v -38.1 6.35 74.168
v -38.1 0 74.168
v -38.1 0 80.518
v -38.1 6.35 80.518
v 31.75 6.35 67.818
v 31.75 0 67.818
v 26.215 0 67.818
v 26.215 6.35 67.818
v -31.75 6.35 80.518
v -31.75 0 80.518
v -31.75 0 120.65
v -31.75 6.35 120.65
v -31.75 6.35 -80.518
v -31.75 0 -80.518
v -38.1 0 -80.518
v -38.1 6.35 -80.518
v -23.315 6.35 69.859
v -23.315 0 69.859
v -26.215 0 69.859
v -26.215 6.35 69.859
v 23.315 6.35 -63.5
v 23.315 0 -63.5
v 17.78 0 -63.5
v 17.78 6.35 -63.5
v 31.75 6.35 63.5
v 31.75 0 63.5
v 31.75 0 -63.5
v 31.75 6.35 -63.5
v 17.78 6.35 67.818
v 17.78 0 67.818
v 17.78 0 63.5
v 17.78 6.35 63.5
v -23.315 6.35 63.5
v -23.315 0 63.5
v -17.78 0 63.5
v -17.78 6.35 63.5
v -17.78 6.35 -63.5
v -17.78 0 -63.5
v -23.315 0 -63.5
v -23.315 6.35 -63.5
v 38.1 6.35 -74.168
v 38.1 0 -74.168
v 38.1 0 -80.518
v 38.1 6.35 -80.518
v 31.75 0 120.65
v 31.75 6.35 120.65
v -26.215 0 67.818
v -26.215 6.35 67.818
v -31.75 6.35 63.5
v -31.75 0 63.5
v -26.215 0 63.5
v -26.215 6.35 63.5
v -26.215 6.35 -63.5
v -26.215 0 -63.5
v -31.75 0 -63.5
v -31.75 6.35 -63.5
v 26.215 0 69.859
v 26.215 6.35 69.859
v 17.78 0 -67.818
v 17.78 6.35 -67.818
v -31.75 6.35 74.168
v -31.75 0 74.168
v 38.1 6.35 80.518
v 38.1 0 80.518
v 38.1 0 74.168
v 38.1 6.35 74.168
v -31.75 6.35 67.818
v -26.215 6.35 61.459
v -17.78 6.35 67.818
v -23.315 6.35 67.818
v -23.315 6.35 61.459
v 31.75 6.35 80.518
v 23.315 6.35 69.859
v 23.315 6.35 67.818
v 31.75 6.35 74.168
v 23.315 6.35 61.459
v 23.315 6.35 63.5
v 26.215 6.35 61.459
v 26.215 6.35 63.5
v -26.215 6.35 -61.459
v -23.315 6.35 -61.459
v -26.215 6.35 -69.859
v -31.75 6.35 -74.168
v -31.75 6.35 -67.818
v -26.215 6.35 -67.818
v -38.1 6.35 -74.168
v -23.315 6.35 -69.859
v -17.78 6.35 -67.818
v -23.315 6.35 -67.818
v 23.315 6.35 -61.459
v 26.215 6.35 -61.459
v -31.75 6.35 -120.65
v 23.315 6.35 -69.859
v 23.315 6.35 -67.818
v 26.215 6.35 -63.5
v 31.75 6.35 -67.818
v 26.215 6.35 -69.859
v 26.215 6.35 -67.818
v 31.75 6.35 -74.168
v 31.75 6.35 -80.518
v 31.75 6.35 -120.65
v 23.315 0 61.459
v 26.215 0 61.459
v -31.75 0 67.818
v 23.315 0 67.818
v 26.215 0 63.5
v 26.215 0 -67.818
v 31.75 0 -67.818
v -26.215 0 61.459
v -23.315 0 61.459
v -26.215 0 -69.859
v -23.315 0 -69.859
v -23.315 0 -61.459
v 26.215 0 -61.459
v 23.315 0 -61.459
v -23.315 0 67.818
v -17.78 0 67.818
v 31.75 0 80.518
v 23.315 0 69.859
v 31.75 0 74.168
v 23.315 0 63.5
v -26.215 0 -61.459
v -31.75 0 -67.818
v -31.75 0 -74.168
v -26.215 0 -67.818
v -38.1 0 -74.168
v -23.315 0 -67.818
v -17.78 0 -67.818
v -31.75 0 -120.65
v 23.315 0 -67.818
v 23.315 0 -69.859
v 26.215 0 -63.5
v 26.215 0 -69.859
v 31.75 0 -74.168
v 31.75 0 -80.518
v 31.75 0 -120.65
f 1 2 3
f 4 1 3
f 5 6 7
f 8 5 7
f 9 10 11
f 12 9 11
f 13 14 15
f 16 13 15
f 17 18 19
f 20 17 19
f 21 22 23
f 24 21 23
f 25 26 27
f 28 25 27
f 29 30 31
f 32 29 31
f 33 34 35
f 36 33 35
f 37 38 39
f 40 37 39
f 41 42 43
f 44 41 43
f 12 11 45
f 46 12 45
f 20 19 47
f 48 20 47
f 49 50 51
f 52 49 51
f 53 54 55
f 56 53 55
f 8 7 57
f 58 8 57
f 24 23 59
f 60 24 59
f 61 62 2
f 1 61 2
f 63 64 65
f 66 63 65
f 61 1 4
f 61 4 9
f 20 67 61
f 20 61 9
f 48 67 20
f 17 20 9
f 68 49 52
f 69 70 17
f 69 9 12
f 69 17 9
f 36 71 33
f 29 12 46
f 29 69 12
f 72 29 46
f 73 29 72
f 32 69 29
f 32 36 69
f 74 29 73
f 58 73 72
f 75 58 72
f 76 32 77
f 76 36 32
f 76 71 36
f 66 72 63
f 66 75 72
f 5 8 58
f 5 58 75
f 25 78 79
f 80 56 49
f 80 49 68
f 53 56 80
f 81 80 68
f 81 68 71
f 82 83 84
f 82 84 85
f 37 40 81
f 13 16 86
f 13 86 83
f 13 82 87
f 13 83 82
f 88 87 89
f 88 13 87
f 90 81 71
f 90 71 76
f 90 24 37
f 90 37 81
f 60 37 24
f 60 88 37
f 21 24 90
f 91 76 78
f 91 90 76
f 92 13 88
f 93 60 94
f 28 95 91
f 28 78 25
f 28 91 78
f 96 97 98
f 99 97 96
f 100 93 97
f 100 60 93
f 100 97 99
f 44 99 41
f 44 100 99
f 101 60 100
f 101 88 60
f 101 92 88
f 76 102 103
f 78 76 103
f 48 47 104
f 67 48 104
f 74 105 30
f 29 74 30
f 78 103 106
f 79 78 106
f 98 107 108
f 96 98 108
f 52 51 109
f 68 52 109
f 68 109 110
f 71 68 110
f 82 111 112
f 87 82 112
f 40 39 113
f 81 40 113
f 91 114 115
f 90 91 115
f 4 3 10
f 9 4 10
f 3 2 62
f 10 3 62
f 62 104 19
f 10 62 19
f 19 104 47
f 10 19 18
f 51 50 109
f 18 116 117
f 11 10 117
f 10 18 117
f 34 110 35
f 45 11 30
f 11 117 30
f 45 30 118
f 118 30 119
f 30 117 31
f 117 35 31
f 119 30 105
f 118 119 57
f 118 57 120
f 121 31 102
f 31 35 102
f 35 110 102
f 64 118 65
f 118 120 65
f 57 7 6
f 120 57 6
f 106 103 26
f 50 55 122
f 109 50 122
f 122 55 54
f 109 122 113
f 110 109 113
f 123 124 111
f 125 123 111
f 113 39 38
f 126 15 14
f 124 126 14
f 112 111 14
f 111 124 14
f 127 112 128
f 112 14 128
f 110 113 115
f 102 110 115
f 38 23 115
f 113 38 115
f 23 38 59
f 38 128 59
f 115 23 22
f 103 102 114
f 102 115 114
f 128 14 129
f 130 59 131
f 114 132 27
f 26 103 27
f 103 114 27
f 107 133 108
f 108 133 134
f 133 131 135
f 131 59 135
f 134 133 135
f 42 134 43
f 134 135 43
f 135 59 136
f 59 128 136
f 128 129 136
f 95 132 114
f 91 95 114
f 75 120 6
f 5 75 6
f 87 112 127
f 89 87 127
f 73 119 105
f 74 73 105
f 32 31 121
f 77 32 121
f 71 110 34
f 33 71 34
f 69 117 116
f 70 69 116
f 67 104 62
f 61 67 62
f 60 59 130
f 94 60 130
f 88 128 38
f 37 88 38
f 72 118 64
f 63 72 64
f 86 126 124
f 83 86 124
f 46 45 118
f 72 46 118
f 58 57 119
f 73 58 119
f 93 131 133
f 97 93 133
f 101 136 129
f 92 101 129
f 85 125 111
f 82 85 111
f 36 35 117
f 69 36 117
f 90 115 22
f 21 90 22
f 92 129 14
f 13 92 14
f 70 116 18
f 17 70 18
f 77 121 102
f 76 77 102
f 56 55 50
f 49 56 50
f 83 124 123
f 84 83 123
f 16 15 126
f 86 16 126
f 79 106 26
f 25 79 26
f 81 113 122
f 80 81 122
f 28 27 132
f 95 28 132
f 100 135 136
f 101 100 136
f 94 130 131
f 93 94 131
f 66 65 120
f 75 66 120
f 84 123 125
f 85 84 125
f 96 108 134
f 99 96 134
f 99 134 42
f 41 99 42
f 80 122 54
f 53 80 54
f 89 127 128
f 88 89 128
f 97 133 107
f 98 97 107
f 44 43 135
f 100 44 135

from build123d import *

# Parameters (mm, degrees)
BOSS_EXTRUDE1_DEPTH = 6.35


with BuildPart() as part:
    # Elevator Belt Backplate → Boss-Extrude1 (new body)
    with BuildSketch(Plane(origin=(0, 0, 0), x_dir=(1, 0, 0), z_dir=(0, 1, 0))):
        Polygon((-31.75, -120.65), (31.75, -120.65), (31.75, -80.518), (38.1, -80.518), (38.1, -74.168), (31.75, -74.168), (31.75, -67.818), (26.215000021, -67.818), (26.215000021, -69.858999982), (23.314999979, -69.858999982), (23.314999979, -67.818), (17.78, -67.818), (17.78, -63.5), (23.314999979, -63.5), (23.314999979, -61.459000018), (26.215000021, -61.459000018), (26.215000021, -63.5), (31.75, -63.5), (31.75, 63.5), (26.215000021, 63.5), (26.215000021, 61.459000018), (23.314999979, 61.459000018), (23.314999979, 63.5), (17.78, 63.5), (17.78, 67.818), (23.314999979, 67.818), (23.314999979, 69.858999982), (26.215000021, 69.858999982), (26.215000021, 67.818), (31.75, 67.818), (31.75, 74.168), (38.1, 74.168), (38.1, 80.518), (31.75, 80.518), (31.75, 120.65), (-31.75, 120.65), (-31.75, 80.518), (-38.1, 80.518), (-38.1, 74.168), (-31.75, 74.168), (-31.75, 67.818), (-26.215000021, 67.818), (-26.215000021, 69.858999982), (-23.314999979, 69.858999982), (-23.314999979, 67.818), (-17.78, 67.818), (-17.78, 63.5), (-23.314999979, 63.5), (-23.314999979, 61.459000018), (-26.215000021, 61.459000018), (-26.215000021, 63.5), (-31.75, 63.5), (-31.75, -63.5), (-26.215000021, -63.5), (-26.215000021, -61.459000018), (-23.314999979, -61.459000018), (-23.314999979, -63.5), (-17.78, -63.5), (-17.78, -67.818), (-23.314999979, -67.818), (-23.314999979, -69.858999982), (-26.215000021, -69.858999982), (-26.215000021, -67.818), (-31.75, -67.818), (-31.75, -74.168), (-38.1, -74.168), (-38.1, -80.518), (-31.75, -80.518), align=None)
    extrude(amount=BOSS_EXTRUDE1_DEPTH)


solid = part.part
